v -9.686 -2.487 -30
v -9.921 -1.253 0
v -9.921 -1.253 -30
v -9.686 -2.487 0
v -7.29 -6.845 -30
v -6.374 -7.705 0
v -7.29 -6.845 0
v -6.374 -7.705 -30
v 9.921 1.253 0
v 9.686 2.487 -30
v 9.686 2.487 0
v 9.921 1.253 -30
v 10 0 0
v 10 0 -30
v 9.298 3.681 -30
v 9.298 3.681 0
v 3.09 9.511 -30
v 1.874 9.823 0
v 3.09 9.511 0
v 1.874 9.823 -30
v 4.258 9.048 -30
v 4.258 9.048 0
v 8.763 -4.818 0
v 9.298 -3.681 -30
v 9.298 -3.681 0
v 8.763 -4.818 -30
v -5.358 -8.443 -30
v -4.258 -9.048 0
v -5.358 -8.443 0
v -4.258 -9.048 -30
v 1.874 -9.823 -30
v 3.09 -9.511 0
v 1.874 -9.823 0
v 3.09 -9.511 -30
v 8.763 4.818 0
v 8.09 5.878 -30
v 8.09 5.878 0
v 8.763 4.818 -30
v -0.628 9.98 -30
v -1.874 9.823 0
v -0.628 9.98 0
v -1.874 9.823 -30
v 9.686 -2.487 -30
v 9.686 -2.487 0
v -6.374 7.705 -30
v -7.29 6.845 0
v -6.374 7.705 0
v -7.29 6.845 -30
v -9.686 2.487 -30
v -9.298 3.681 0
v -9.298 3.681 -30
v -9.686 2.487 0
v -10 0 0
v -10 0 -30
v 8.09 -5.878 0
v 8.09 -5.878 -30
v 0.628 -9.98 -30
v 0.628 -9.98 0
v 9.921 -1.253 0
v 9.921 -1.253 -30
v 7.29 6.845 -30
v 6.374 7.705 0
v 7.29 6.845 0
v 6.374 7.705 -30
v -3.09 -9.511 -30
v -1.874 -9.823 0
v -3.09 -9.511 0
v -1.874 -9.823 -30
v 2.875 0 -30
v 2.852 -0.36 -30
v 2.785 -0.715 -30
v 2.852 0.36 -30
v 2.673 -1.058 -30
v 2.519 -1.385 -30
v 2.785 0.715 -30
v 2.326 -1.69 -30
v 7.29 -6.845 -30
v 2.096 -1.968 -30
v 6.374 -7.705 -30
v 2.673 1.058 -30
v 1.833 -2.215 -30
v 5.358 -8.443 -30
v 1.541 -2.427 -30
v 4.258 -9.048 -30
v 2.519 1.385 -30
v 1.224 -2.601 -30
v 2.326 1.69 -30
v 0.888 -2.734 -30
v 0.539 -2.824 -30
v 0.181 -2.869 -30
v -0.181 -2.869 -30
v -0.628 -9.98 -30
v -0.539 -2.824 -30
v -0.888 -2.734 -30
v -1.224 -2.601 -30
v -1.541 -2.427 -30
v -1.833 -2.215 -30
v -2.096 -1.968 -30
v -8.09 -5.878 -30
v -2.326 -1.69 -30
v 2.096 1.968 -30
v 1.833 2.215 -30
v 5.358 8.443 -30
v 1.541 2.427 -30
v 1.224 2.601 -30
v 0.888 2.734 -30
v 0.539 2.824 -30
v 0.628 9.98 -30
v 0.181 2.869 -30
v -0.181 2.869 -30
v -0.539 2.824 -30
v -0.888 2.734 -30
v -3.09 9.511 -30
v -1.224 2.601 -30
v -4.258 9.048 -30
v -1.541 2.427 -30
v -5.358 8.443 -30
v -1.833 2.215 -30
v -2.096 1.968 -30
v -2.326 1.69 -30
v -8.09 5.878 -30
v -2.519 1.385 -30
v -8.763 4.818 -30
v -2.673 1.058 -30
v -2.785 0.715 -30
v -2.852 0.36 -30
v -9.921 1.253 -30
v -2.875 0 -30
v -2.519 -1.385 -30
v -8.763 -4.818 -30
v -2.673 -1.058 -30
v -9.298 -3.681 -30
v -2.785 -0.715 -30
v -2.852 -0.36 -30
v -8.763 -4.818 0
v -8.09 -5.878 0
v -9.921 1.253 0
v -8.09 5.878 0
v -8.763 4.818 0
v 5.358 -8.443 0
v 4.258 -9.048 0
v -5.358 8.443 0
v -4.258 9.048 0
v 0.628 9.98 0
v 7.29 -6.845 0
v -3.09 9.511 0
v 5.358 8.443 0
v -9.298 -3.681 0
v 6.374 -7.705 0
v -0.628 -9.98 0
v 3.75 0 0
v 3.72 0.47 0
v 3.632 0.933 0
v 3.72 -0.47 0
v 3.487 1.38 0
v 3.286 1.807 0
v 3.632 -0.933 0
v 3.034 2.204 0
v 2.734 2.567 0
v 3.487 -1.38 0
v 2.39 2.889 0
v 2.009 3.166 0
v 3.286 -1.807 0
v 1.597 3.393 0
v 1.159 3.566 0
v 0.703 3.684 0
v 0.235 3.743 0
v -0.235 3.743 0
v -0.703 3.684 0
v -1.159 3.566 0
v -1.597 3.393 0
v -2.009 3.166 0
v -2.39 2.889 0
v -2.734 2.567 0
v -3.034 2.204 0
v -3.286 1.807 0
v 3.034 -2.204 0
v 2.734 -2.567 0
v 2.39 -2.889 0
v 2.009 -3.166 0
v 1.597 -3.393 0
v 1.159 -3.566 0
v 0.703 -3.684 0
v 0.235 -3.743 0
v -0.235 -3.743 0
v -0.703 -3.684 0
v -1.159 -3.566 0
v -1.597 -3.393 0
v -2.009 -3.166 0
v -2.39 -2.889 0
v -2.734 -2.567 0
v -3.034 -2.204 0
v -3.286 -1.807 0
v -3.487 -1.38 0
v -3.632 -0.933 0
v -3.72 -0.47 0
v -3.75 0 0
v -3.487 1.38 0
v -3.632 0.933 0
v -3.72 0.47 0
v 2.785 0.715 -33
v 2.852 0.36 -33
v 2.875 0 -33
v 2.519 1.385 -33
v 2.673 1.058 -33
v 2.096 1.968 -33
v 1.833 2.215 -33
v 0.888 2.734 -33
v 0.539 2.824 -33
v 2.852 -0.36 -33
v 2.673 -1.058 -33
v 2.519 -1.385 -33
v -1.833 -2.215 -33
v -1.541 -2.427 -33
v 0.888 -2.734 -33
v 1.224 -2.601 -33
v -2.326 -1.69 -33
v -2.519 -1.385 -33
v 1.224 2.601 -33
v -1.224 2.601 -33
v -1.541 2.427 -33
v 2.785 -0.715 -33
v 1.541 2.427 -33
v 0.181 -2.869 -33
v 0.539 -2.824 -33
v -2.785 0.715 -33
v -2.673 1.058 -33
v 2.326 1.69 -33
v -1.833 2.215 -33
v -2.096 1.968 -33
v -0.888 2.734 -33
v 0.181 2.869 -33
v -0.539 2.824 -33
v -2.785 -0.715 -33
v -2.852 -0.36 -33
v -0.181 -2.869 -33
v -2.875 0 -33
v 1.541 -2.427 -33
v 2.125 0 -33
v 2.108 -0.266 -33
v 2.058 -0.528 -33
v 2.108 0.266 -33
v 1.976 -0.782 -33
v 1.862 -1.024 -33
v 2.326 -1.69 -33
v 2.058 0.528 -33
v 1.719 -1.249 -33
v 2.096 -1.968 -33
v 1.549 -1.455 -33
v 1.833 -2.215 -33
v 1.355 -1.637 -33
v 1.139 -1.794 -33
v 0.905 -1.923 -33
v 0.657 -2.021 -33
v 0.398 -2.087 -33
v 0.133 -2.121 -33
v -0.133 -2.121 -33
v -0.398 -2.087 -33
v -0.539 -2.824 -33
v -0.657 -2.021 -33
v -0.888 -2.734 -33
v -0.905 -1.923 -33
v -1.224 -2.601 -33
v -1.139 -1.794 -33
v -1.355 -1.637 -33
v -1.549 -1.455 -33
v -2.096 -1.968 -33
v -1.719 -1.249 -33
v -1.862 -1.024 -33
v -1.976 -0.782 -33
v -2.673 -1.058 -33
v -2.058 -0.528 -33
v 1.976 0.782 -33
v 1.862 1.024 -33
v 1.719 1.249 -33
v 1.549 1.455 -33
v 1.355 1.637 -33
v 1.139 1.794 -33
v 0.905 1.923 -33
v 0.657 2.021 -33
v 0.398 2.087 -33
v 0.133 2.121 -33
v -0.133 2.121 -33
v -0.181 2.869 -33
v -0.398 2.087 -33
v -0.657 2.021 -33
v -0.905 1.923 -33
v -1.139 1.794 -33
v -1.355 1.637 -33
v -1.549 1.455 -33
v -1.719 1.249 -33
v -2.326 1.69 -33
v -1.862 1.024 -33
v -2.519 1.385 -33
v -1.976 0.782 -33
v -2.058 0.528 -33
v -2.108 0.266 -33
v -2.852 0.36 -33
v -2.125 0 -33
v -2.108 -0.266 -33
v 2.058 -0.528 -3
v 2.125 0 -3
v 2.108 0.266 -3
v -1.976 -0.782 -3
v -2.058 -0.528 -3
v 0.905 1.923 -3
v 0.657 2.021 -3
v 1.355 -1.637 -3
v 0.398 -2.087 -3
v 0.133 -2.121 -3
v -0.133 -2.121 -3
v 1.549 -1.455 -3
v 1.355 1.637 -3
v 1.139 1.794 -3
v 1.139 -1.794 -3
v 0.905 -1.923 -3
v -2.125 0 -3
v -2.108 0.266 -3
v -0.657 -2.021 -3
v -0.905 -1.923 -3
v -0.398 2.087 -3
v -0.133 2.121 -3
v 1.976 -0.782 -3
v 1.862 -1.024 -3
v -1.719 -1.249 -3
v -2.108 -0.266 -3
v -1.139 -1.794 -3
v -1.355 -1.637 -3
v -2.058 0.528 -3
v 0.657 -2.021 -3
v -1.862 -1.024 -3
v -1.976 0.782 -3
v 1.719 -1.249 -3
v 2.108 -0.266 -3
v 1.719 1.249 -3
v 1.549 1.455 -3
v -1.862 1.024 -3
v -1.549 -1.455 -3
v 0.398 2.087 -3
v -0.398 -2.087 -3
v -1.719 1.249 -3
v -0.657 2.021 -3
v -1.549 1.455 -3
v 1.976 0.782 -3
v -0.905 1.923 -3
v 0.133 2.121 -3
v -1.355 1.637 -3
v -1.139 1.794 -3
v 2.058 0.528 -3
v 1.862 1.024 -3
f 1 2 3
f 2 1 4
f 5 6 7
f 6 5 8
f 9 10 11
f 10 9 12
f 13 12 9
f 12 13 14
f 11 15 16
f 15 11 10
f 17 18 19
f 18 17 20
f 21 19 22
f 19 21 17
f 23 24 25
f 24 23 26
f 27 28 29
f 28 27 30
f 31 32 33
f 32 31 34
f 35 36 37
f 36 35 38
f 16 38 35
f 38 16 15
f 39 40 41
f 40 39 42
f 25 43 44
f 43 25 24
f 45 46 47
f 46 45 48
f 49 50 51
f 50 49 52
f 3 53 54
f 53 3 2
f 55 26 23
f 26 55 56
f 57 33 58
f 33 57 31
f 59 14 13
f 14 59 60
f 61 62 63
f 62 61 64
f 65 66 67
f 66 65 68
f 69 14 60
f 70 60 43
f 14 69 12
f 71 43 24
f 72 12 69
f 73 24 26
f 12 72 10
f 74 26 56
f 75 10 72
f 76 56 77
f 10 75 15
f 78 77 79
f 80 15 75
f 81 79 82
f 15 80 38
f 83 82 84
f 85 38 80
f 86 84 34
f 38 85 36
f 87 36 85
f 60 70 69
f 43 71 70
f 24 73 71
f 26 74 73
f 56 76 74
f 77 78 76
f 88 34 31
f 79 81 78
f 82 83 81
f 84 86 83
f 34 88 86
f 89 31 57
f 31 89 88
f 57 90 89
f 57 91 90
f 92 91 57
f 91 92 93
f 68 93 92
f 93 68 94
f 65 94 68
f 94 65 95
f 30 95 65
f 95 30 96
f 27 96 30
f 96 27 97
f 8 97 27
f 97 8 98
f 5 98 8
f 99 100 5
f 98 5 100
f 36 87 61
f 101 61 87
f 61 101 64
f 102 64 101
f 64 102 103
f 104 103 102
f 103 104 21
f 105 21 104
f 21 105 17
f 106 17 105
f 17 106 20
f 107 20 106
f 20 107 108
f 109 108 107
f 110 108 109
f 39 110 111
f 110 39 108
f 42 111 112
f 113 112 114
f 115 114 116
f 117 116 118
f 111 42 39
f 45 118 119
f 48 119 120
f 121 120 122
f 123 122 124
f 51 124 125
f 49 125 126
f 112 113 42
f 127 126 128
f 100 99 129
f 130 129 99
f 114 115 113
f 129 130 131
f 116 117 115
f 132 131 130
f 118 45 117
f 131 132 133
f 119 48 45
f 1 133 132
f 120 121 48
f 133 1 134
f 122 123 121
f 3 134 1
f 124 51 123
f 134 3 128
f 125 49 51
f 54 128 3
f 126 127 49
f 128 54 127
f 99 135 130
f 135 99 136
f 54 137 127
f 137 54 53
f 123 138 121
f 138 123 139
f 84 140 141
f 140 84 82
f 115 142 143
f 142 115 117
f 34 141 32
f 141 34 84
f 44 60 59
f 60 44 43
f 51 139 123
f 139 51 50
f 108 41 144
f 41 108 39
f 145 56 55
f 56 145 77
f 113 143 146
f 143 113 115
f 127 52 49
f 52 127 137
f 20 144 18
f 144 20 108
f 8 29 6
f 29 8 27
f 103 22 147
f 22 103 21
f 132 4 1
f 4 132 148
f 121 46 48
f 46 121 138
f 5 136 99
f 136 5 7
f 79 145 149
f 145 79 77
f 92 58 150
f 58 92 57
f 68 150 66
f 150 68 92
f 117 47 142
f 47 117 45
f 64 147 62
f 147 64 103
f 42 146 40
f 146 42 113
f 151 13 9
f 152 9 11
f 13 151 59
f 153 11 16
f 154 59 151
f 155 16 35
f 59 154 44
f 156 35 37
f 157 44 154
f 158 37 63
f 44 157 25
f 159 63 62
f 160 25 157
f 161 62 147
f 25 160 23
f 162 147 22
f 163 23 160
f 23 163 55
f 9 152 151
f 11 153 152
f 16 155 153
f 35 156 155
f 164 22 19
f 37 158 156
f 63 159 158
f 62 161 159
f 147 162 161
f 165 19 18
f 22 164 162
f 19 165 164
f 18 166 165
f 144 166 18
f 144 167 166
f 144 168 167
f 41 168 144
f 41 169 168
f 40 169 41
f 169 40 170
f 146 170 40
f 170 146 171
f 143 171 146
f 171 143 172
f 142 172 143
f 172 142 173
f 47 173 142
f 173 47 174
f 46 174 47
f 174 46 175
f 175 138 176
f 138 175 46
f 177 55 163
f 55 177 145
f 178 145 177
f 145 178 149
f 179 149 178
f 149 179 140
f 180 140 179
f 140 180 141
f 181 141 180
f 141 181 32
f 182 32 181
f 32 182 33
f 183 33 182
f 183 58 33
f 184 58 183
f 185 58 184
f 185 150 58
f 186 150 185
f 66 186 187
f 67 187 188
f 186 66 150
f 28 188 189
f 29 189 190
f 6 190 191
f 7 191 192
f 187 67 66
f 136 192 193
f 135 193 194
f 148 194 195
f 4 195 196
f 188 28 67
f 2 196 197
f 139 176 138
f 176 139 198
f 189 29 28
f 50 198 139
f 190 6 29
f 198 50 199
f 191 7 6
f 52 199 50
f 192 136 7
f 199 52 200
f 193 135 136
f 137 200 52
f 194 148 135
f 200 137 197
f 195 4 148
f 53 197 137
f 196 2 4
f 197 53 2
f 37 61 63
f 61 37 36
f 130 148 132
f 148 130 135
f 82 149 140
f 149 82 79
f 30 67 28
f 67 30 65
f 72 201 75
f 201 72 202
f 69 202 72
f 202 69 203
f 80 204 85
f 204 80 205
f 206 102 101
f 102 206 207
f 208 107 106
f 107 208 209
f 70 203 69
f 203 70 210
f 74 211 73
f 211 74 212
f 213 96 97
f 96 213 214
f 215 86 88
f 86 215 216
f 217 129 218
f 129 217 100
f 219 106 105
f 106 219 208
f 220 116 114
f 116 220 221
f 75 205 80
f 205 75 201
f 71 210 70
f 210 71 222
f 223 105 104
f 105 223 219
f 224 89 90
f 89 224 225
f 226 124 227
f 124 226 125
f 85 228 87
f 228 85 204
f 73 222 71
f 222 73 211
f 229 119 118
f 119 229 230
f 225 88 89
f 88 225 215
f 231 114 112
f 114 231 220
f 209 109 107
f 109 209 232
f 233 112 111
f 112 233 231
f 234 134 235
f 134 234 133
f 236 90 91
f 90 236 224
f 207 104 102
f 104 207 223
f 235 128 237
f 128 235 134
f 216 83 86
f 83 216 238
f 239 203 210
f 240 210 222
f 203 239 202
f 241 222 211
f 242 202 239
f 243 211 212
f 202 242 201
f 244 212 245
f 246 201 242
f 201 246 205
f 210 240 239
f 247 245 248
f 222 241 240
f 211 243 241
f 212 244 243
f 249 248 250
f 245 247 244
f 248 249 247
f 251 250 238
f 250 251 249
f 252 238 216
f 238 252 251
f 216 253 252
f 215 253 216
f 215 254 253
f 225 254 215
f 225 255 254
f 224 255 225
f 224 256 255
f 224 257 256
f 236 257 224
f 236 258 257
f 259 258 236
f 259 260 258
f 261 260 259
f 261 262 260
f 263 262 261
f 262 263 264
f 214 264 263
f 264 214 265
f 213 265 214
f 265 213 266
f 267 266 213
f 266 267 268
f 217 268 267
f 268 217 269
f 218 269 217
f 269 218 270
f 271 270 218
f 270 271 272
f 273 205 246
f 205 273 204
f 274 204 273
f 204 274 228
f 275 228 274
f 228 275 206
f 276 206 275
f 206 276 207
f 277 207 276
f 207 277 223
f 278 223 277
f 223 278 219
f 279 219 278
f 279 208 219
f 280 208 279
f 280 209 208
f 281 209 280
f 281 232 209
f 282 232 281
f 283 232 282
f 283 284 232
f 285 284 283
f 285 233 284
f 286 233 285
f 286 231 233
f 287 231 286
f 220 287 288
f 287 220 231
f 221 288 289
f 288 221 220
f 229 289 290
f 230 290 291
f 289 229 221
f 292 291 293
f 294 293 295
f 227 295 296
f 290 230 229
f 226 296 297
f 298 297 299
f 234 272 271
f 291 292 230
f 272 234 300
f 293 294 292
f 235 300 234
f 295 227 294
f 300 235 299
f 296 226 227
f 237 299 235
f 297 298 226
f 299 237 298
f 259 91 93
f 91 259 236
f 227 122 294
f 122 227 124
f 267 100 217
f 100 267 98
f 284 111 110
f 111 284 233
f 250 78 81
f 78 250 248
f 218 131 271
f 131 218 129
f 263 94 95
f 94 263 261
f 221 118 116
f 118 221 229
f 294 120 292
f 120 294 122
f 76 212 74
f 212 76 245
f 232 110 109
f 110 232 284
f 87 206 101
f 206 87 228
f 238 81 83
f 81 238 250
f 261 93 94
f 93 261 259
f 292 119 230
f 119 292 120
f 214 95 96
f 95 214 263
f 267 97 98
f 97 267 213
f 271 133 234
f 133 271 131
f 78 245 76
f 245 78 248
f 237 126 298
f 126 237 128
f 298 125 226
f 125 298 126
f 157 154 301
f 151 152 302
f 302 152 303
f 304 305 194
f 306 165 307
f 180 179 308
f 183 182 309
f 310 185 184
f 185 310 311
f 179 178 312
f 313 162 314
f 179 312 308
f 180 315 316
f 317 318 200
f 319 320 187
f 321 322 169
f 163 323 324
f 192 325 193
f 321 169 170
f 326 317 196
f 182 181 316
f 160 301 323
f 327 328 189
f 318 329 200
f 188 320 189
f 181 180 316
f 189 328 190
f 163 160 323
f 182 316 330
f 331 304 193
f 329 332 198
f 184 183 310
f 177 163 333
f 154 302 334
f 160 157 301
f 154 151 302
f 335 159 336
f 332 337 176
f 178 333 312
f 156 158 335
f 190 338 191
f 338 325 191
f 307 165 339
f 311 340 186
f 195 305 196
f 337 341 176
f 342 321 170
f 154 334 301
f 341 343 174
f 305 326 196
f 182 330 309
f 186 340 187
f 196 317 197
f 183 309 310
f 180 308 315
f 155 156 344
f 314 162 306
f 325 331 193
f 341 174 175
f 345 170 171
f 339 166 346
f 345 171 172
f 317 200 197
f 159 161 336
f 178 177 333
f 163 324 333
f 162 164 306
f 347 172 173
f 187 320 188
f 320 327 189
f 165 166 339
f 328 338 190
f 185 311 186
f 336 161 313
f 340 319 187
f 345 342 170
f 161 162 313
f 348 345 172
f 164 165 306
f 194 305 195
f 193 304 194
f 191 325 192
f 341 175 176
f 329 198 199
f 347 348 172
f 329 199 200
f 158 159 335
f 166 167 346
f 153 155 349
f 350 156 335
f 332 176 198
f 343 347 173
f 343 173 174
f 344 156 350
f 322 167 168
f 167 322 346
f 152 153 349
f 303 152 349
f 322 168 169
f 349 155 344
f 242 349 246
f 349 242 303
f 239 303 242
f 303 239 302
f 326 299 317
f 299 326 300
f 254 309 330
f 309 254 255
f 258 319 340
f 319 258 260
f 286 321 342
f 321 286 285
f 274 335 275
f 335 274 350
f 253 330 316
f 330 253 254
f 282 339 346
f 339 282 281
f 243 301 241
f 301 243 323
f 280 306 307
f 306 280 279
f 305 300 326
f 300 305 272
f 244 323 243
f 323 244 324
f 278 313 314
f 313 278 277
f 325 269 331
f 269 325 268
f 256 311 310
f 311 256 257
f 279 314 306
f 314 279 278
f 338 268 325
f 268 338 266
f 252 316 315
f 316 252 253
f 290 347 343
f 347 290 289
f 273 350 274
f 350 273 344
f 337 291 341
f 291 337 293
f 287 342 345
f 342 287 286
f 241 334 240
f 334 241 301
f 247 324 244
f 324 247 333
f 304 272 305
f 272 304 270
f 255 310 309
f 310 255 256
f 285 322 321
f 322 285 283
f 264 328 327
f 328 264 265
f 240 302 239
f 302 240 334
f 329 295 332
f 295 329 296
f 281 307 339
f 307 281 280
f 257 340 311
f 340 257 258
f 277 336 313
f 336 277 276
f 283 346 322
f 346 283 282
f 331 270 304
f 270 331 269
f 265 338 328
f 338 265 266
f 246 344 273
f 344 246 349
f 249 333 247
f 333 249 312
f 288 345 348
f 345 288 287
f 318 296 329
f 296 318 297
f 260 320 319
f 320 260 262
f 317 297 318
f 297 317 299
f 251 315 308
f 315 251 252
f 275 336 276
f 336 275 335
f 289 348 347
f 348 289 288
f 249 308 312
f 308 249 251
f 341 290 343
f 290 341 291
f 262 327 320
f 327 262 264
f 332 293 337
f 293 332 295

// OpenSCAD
$fn = 50;


difference() {
	union() {
		translate(v = [0, 0, -30.0000000000]) {
			cylinder(h = 30, r = 10.0000000000);
		}
		#translate(v = [0, 0, -33.0000000000]) {
			cylinder(h = 33, r = 2.8750000000);
		}
	}
	union() {
		translate(v = [0, 0, 0]) {
			rotate(a = [0, 0, 0]) {
				difference() {
					union() {
						translate(v = [0, 0, -33.0000000000]) {
							cylinder(h = 33, r = 2.0000000000);
						}
						translate(v = [0, 0, -3]) {
							cylinder(h = 3, r1 = 2.1250000000, r2 = 3.7500000000);
						}
						translate(v = [0, 0, -33.0000000000]) {
							cylinder(h = 33, r = 2.1250000000);
						}
						translate(v = [0, 0, -33.0000000000]) {
							cylinder(h = 33, r = 2.0000000000);
						}
					}
					union();
				}
			}
		}
	}
}
